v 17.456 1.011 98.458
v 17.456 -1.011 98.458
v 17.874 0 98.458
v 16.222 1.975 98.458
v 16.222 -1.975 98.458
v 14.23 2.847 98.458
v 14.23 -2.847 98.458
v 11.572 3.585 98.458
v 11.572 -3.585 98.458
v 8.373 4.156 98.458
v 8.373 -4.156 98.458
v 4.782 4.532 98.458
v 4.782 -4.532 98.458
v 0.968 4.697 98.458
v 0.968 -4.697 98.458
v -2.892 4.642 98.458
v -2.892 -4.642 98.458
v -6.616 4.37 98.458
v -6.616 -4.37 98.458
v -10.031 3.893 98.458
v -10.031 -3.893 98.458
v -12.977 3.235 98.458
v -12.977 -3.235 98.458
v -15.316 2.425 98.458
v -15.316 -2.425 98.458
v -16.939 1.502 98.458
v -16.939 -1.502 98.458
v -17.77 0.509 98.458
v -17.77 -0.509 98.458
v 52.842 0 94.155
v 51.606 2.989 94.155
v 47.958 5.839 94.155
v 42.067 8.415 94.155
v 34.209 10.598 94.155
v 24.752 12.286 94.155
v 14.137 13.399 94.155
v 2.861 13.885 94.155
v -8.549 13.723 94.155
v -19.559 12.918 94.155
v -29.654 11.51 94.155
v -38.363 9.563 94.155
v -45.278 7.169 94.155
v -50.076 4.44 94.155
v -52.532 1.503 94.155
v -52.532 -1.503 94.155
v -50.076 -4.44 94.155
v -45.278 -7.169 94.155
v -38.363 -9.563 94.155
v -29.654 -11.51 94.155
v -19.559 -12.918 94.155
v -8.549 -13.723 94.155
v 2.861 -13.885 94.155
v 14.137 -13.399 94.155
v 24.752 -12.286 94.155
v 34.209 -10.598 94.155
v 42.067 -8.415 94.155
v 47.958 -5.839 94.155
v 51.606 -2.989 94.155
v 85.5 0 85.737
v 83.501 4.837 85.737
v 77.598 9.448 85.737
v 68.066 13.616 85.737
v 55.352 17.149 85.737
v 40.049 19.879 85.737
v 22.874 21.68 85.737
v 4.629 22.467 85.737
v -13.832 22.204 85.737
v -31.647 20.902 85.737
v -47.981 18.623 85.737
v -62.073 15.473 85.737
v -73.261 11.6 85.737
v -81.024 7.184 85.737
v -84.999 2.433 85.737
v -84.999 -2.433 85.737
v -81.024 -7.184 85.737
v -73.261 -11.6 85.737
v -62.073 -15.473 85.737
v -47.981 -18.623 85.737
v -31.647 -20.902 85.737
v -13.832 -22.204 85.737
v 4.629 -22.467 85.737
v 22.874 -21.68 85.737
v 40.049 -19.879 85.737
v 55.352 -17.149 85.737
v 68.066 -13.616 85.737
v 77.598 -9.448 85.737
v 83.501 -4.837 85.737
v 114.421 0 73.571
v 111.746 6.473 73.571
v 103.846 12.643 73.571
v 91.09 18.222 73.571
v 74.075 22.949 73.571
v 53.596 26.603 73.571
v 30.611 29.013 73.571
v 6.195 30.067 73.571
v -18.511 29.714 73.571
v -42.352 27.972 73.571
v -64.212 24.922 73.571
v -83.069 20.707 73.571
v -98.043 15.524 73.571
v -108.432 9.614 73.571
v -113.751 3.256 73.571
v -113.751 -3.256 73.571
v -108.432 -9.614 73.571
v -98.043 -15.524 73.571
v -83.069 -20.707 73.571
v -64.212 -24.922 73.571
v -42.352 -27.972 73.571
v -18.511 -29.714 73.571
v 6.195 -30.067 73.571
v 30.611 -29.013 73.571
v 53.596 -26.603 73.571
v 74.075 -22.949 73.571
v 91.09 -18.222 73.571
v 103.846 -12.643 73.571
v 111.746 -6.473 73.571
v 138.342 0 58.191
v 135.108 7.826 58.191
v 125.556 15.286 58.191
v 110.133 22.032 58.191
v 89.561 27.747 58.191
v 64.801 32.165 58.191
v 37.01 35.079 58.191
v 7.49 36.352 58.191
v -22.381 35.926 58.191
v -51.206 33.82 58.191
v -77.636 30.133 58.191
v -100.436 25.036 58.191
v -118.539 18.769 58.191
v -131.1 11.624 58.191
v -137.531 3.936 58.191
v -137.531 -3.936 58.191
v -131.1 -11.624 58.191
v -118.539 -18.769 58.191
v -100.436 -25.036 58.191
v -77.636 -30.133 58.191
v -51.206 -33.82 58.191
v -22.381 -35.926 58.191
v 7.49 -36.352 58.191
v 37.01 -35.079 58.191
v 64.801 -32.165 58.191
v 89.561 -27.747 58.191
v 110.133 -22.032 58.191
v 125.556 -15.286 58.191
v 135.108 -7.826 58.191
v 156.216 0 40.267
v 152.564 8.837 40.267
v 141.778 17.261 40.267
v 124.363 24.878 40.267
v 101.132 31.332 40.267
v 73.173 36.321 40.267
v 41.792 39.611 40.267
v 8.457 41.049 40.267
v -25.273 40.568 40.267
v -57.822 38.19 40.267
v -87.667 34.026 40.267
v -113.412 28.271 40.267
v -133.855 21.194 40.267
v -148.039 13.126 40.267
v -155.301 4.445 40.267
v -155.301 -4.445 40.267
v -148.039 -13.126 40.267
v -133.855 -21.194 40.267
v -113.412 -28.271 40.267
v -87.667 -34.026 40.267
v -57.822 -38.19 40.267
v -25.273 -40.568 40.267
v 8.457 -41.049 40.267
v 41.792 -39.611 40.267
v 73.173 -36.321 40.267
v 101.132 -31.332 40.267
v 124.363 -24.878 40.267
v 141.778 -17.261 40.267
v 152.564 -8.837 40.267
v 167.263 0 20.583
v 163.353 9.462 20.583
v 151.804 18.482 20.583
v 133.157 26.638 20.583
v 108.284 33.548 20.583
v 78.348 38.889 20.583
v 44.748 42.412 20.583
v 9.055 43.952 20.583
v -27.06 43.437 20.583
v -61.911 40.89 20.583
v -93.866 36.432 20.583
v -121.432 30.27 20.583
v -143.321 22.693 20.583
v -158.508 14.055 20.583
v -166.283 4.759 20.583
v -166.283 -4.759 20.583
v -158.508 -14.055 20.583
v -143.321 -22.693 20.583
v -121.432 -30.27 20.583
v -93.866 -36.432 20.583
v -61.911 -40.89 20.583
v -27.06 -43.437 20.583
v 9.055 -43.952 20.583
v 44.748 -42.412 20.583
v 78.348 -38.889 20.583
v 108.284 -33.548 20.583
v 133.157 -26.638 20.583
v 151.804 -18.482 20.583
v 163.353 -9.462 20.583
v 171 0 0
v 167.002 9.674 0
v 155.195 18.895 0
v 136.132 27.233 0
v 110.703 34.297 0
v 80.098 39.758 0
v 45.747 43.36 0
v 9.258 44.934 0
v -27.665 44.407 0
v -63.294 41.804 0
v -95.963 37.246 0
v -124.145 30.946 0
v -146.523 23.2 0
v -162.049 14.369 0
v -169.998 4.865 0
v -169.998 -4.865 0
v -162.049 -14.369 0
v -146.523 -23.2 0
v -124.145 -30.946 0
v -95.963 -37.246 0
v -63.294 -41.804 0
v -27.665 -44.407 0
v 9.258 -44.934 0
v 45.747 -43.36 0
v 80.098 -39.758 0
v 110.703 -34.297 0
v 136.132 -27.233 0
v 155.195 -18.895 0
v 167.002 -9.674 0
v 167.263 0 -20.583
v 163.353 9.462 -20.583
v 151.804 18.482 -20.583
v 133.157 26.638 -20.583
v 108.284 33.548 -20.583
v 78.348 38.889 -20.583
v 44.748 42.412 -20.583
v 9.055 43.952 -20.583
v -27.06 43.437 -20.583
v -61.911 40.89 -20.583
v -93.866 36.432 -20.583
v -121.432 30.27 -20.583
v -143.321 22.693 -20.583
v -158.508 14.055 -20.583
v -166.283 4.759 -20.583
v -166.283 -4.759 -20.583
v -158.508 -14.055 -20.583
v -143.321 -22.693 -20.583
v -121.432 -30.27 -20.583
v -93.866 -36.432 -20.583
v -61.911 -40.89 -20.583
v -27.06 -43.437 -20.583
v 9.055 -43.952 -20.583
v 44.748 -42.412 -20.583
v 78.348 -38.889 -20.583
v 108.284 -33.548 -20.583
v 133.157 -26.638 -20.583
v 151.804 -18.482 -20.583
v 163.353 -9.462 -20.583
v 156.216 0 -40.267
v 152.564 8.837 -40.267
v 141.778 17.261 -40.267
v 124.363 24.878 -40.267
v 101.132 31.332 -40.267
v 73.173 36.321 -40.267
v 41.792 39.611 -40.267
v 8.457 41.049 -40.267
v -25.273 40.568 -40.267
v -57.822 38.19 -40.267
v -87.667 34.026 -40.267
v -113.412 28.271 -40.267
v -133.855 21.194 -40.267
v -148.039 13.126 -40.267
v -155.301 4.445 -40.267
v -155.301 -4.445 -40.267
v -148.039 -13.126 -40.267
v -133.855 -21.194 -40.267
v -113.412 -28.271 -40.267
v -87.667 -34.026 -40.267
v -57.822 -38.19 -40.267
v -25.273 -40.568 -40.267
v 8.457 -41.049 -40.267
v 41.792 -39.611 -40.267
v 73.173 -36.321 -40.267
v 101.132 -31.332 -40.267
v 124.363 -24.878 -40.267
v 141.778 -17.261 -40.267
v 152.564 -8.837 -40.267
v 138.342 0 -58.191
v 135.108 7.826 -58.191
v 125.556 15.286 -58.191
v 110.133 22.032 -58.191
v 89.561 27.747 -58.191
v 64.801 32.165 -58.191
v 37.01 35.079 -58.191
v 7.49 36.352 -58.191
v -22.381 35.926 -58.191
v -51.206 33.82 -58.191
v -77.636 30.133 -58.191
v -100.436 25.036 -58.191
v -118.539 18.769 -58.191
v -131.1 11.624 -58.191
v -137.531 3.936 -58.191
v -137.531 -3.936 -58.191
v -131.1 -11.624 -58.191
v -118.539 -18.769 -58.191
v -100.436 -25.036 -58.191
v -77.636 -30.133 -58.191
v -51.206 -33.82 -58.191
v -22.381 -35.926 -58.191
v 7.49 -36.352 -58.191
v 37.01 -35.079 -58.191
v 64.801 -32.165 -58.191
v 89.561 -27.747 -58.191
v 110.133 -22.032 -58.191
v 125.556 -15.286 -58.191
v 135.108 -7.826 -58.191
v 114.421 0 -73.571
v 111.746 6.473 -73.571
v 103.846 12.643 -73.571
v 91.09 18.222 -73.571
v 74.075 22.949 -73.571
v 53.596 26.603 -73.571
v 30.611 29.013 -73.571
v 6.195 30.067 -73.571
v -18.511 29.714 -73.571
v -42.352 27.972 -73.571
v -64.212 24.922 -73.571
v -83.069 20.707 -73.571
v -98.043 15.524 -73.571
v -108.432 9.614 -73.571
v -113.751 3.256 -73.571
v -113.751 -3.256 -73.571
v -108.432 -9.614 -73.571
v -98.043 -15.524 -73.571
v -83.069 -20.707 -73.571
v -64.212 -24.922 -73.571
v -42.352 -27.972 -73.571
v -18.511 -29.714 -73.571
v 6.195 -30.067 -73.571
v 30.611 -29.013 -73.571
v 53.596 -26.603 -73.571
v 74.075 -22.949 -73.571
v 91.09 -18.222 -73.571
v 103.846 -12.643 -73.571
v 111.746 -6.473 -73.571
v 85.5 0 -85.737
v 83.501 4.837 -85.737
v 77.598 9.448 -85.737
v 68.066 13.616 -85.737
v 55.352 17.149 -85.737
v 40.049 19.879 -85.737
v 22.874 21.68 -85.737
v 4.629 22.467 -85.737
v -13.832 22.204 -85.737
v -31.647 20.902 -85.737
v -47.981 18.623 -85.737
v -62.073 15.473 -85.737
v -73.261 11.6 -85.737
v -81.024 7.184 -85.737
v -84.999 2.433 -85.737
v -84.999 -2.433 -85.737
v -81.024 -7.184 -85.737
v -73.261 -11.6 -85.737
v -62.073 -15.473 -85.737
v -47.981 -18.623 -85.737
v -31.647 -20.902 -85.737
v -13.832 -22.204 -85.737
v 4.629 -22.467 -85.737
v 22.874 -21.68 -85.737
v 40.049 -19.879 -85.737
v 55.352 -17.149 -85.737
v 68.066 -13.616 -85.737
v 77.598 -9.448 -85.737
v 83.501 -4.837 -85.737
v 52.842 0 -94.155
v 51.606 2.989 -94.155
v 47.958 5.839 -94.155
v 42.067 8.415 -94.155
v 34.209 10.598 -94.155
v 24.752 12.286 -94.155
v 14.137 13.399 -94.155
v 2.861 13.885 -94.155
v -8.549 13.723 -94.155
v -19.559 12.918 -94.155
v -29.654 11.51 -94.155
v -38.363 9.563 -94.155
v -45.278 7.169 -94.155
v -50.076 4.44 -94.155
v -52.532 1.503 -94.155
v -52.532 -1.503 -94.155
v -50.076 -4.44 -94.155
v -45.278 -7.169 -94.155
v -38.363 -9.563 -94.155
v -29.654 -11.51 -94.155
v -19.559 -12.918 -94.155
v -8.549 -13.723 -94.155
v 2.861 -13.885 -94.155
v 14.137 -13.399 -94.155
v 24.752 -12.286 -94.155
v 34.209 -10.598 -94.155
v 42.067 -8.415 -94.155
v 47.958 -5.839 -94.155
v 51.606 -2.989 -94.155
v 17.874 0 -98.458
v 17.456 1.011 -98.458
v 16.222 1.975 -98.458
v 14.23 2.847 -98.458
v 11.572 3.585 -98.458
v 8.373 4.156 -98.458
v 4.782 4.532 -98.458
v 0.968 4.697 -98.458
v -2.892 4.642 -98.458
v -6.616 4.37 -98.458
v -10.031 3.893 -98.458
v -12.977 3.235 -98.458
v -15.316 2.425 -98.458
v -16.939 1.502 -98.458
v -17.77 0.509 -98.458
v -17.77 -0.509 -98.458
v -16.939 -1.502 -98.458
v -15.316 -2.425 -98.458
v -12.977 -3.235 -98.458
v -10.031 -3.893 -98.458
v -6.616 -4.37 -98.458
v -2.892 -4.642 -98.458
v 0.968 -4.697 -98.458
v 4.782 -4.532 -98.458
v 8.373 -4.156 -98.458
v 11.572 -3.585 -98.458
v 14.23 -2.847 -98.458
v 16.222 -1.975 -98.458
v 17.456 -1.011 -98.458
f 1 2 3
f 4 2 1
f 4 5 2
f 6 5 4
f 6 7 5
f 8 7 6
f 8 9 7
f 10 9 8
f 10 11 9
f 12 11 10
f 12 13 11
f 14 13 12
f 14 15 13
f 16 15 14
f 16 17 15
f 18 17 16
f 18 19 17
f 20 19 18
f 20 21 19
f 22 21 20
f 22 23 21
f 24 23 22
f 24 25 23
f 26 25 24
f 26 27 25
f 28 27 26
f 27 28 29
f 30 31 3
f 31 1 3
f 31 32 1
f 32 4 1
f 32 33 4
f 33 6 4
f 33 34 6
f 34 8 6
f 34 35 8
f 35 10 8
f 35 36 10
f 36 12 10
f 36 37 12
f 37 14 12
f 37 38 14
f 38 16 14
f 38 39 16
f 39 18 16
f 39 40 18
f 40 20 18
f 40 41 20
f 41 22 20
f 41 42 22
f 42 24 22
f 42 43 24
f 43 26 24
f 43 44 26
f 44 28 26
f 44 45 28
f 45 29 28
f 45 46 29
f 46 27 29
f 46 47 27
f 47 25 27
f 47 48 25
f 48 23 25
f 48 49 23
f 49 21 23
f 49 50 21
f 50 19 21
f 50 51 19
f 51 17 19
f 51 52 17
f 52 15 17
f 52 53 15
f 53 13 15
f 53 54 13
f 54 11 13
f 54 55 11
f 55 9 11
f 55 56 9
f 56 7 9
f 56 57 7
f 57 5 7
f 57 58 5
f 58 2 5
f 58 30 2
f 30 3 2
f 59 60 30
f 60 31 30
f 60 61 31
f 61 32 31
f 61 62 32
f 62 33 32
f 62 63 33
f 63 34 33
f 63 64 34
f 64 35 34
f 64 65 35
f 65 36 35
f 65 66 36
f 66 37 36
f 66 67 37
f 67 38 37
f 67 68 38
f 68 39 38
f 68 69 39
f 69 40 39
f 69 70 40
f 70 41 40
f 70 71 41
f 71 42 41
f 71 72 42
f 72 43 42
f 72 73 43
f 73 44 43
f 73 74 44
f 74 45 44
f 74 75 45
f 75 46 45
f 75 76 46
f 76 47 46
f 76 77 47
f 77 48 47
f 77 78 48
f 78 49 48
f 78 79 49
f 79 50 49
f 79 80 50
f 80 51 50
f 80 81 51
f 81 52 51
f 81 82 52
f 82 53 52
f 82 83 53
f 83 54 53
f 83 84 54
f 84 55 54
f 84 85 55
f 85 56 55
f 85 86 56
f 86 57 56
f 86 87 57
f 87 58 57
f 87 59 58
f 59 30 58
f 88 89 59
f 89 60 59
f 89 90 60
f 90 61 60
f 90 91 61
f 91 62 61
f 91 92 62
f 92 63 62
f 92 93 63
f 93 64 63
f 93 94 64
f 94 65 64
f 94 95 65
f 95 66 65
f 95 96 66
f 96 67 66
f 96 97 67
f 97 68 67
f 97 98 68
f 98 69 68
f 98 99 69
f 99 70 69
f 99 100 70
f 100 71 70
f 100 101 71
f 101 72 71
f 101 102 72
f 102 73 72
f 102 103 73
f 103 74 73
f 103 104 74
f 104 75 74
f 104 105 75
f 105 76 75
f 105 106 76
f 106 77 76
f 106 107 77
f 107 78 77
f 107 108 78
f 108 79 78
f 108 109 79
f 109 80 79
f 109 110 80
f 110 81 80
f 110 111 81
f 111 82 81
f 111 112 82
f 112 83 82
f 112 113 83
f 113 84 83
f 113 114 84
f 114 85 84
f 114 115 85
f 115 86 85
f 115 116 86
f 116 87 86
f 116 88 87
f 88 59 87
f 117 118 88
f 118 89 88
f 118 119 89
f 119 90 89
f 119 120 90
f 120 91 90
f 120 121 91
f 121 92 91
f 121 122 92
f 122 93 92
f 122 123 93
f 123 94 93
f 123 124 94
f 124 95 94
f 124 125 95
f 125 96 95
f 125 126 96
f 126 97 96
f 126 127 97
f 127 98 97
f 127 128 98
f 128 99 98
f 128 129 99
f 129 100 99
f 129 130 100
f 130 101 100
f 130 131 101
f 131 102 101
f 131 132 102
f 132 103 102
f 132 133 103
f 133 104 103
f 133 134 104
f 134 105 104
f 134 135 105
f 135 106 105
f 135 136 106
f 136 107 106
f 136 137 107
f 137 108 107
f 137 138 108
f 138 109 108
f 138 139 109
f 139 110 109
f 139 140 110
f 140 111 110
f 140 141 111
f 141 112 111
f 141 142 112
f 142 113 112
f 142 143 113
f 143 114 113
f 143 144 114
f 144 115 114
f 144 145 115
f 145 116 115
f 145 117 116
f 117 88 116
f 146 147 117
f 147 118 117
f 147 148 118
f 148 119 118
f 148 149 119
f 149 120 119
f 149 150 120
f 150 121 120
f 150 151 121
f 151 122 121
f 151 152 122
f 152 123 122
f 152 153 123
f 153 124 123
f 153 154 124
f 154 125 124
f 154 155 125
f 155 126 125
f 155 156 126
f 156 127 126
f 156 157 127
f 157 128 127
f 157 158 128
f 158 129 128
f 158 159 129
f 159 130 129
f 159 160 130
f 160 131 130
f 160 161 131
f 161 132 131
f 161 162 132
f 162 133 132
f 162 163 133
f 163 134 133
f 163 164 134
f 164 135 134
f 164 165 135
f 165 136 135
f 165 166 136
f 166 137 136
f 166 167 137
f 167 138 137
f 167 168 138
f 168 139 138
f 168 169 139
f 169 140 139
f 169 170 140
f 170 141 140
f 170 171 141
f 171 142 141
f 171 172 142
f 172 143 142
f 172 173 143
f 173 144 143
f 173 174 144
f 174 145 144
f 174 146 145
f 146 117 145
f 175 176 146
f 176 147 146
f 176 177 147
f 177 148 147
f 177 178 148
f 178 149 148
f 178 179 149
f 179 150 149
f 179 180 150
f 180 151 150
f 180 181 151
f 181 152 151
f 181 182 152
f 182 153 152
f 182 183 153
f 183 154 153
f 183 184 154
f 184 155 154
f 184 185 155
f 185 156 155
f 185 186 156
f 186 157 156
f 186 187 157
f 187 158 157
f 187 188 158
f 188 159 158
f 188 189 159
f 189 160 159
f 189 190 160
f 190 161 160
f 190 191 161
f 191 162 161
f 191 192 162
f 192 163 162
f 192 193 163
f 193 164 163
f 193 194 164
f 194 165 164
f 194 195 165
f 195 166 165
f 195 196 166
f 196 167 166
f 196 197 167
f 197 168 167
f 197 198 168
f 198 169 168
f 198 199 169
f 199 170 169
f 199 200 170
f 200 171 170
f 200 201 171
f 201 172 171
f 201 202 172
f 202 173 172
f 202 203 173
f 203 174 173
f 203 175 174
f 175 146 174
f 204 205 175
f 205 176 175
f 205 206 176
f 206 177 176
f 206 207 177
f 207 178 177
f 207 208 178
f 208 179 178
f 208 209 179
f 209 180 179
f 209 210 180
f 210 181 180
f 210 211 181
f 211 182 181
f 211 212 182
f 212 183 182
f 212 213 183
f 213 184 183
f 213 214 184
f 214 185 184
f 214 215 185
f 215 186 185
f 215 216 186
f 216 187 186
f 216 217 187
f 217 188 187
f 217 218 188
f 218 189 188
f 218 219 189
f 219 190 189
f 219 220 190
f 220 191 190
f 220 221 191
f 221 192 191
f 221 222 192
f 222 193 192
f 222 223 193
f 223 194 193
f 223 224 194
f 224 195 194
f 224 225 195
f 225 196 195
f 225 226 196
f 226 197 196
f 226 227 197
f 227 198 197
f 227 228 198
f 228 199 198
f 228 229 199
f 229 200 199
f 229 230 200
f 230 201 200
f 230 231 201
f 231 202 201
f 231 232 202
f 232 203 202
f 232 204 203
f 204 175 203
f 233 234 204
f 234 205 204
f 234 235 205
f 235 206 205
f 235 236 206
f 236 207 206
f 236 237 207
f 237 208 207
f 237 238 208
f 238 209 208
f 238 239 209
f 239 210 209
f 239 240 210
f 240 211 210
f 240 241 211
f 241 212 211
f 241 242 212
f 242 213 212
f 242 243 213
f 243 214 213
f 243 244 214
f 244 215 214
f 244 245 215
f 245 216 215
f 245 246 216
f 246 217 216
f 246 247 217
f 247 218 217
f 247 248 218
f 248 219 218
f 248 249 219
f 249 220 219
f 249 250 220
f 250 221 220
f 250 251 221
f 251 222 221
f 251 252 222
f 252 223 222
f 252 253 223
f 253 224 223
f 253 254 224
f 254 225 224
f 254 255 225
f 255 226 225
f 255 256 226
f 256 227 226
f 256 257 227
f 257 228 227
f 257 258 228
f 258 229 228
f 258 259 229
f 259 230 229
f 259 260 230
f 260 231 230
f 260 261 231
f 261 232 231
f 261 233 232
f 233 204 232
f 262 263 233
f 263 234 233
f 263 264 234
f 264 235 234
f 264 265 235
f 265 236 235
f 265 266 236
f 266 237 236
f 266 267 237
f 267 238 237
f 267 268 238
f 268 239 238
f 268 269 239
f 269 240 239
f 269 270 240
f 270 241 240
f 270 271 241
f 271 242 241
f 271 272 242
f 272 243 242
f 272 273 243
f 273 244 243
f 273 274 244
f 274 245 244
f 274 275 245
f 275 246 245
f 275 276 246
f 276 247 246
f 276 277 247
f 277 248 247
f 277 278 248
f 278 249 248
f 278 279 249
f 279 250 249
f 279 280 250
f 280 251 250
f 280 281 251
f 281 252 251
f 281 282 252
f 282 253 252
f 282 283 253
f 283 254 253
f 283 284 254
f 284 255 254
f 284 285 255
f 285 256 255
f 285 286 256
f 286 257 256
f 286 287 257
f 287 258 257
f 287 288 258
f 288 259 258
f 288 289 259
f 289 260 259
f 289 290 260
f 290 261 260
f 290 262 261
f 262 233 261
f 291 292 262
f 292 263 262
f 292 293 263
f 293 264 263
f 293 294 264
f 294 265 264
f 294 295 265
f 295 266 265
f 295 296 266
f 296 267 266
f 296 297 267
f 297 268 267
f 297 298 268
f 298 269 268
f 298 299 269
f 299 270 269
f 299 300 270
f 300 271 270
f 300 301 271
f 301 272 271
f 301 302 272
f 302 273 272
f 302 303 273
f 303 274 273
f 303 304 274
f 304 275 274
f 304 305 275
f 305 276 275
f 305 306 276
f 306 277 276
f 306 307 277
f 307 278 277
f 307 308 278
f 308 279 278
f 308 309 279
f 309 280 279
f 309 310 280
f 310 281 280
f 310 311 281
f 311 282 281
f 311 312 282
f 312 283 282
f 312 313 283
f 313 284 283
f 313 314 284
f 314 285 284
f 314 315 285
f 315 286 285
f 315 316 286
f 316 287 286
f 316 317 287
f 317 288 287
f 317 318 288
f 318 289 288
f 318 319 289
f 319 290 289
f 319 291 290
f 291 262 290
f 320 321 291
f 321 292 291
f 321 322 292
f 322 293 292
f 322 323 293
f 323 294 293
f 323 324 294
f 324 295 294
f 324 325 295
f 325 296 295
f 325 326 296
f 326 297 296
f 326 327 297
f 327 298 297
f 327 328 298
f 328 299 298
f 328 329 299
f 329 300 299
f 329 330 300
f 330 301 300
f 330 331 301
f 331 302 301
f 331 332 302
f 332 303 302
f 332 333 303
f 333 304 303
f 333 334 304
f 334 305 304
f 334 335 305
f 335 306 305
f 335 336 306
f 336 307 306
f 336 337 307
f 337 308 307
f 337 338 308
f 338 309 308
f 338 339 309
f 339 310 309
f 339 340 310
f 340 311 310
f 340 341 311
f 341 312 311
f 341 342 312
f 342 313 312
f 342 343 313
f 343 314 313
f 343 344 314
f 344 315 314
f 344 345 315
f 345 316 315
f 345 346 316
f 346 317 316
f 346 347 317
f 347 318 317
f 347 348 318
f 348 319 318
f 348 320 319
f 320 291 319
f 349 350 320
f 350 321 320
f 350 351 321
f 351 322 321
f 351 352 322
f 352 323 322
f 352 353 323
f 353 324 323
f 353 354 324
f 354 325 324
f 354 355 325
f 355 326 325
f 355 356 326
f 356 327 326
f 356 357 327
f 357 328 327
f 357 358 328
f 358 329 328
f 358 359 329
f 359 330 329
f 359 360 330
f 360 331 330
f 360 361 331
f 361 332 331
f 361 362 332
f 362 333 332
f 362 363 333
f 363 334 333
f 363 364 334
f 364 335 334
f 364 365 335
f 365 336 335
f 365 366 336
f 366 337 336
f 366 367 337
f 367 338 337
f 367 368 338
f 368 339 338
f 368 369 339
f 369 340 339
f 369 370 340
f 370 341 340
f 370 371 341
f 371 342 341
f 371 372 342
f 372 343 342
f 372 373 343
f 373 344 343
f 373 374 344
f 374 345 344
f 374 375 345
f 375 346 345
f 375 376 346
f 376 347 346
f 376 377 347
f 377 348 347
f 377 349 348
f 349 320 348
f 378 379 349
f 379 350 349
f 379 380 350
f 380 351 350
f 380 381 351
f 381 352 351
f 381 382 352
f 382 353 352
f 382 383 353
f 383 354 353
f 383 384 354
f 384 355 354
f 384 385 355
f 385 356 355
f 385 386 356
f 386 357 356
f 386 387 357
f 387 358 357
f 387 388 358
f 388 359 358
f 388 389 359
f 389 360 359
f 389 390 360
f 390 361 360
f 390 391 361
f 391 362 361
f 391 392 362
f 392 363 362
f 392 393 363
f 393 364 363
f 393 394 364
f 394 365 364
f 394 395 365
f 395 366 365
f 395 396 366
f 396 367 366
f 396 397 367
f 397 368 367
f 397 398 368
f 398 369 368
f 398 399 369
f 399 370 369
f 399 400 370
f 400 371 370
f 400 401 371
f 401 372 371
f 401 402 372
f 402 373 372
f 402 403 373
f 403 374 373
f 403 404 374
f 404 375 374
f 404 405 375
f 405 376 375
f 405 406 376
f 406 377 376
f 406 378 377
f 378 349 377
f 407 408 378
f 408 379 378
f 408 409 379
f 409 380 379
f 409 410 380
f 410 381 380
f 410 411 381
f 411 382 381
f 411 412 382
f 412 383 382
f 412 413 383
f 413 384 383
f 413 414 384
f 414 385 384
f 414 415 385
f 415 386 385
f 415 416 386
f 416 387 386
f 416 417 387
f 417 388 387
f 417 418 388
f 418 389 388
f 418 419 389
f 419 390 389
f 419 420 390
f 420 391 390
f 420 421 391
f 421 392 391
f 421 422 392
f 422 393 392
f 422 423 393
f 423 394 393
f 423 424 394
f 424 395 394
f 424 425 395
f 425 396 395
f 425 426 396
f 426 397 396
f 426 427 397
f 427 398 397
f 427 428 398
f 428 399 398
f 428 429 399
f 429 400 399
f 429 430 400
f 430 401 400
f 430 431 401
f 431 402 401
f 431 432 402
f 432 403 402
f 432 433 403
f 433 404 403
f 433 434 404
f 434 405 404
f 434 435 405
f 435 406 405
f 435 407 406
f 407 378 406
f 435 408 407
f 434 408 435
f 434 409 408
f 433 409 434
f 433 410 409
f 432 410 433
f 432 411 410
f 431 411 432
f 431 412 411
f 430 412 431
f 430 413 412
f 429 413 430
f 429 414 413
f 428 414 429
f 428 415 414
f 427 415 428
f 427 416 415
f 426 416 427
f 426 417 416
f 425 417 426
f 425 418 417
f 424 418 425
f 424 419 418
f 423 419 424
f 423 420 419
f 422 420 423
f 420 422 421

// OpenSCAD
// Generated by SolidPython 1.0.1 on 2020-07-29 00:46:53


scale(v = [19, 5, 11]) {
	sphere(r = 9);
}
/***********************************************
*********      SolidPython code:      **********
************************************************
 
# import packages: SolidPython
from solid import *
from solid.utils import *
from itertools import chain, combinations, permutations


class Resize:

    def __init__(self, scad_file):
        self.scad_file = scad_file
        #self.scad_file = import_scad(scad_file)
        # cone/cylinder param:
        self.r1 = 0
        self.r2 = 0
        self.h = 0
        # rectangular prism param:
        self.w = 0
        self.l = 0
        # ellipse param:
        self.r = 0

    # import OpenScad code (file name corresponds to shape)


    # classify shape + parameters
    def assign(self, param1, param2, param3):
        if self.scad_file == 'cone.scad':
            self.r1 = param1
            self.r2 = param2
            self.h = param3
        elif self.scad_file == 'cylinder.scad':
            self.r1 = param1
            self.r2 = param2
            self.h = param3
        elif self.scad_file == 'rectangularPrism.scad':
            self.h = param1
            self.l = param2
            self.w = param3
        else:
            self.r = param1
            self.h = param2

    # resize parameters
    def iterate(self):
        x = range(3, 20, 2)
        i = 1
        if self.scad_file == 'cone.scad':
            tempList = list(permutations(x, 2))
            for temp in tempList:
                param1 = temp[0]
                param2 = temp[1]
                filepath = 'produced_scad_files/' + 'cone' + str(param1) + '_' + str(param2) + '_' + '.scad'
                scad_render_to_file(cylinder(h=param1, r1=param2, r2=0), filepath)

        elif self.scad_file == 'cylinder.scad':
            tempList = list(permutations(x, 3))
            for temp in tempList:
                param1 = temp[0]
                param2 = temp[1]
                filepath = 'produced_scad_files/' + 'cylinder' + str(param1) + '_' + str(param2) + '_' + '.scad'
                scad_render_to_file(cylinder(h=param1, r1=param2, r2=param2), filepath)

        elif self.scad_file == 'rectangularPrism.scad':
            tempList = list(permutations(x, 3))
            for temp in tempList:
                param1 = temp[0]
                param2 = temp[1]
                param3 = temp[2]
                filepath = 'produced_scad_files/' + 'rectangularPrism' + str(param1) + '_' + str(param2) + '_' + str(
                    param3) + '.scad'
                scad_render_to_file(cube(size=(param1, param2, param3)), filepath)

        elif self.scad_file == 'ellipse.scad':
            tempList = list(permutations(x, 4))
            for temp in tempList:
                param1 = temp[0]
                param2 = temp[1]
                param3 = temp[2]
                param4 = temp[3]
                filepath = 'produced_scad_files/' + 'ellipse' + str(param1) + '_' + str(param2) + '_' + str(param3) + '_' + str(param4) + '.scad'
                scad_render_to_file(scale([param1, param2, param3])(sphere(r=param4)), filepath)

    def render_to_scadfile(self):
        scad_render_to_file(scad, 'example.scad') 
 
************************************************/
